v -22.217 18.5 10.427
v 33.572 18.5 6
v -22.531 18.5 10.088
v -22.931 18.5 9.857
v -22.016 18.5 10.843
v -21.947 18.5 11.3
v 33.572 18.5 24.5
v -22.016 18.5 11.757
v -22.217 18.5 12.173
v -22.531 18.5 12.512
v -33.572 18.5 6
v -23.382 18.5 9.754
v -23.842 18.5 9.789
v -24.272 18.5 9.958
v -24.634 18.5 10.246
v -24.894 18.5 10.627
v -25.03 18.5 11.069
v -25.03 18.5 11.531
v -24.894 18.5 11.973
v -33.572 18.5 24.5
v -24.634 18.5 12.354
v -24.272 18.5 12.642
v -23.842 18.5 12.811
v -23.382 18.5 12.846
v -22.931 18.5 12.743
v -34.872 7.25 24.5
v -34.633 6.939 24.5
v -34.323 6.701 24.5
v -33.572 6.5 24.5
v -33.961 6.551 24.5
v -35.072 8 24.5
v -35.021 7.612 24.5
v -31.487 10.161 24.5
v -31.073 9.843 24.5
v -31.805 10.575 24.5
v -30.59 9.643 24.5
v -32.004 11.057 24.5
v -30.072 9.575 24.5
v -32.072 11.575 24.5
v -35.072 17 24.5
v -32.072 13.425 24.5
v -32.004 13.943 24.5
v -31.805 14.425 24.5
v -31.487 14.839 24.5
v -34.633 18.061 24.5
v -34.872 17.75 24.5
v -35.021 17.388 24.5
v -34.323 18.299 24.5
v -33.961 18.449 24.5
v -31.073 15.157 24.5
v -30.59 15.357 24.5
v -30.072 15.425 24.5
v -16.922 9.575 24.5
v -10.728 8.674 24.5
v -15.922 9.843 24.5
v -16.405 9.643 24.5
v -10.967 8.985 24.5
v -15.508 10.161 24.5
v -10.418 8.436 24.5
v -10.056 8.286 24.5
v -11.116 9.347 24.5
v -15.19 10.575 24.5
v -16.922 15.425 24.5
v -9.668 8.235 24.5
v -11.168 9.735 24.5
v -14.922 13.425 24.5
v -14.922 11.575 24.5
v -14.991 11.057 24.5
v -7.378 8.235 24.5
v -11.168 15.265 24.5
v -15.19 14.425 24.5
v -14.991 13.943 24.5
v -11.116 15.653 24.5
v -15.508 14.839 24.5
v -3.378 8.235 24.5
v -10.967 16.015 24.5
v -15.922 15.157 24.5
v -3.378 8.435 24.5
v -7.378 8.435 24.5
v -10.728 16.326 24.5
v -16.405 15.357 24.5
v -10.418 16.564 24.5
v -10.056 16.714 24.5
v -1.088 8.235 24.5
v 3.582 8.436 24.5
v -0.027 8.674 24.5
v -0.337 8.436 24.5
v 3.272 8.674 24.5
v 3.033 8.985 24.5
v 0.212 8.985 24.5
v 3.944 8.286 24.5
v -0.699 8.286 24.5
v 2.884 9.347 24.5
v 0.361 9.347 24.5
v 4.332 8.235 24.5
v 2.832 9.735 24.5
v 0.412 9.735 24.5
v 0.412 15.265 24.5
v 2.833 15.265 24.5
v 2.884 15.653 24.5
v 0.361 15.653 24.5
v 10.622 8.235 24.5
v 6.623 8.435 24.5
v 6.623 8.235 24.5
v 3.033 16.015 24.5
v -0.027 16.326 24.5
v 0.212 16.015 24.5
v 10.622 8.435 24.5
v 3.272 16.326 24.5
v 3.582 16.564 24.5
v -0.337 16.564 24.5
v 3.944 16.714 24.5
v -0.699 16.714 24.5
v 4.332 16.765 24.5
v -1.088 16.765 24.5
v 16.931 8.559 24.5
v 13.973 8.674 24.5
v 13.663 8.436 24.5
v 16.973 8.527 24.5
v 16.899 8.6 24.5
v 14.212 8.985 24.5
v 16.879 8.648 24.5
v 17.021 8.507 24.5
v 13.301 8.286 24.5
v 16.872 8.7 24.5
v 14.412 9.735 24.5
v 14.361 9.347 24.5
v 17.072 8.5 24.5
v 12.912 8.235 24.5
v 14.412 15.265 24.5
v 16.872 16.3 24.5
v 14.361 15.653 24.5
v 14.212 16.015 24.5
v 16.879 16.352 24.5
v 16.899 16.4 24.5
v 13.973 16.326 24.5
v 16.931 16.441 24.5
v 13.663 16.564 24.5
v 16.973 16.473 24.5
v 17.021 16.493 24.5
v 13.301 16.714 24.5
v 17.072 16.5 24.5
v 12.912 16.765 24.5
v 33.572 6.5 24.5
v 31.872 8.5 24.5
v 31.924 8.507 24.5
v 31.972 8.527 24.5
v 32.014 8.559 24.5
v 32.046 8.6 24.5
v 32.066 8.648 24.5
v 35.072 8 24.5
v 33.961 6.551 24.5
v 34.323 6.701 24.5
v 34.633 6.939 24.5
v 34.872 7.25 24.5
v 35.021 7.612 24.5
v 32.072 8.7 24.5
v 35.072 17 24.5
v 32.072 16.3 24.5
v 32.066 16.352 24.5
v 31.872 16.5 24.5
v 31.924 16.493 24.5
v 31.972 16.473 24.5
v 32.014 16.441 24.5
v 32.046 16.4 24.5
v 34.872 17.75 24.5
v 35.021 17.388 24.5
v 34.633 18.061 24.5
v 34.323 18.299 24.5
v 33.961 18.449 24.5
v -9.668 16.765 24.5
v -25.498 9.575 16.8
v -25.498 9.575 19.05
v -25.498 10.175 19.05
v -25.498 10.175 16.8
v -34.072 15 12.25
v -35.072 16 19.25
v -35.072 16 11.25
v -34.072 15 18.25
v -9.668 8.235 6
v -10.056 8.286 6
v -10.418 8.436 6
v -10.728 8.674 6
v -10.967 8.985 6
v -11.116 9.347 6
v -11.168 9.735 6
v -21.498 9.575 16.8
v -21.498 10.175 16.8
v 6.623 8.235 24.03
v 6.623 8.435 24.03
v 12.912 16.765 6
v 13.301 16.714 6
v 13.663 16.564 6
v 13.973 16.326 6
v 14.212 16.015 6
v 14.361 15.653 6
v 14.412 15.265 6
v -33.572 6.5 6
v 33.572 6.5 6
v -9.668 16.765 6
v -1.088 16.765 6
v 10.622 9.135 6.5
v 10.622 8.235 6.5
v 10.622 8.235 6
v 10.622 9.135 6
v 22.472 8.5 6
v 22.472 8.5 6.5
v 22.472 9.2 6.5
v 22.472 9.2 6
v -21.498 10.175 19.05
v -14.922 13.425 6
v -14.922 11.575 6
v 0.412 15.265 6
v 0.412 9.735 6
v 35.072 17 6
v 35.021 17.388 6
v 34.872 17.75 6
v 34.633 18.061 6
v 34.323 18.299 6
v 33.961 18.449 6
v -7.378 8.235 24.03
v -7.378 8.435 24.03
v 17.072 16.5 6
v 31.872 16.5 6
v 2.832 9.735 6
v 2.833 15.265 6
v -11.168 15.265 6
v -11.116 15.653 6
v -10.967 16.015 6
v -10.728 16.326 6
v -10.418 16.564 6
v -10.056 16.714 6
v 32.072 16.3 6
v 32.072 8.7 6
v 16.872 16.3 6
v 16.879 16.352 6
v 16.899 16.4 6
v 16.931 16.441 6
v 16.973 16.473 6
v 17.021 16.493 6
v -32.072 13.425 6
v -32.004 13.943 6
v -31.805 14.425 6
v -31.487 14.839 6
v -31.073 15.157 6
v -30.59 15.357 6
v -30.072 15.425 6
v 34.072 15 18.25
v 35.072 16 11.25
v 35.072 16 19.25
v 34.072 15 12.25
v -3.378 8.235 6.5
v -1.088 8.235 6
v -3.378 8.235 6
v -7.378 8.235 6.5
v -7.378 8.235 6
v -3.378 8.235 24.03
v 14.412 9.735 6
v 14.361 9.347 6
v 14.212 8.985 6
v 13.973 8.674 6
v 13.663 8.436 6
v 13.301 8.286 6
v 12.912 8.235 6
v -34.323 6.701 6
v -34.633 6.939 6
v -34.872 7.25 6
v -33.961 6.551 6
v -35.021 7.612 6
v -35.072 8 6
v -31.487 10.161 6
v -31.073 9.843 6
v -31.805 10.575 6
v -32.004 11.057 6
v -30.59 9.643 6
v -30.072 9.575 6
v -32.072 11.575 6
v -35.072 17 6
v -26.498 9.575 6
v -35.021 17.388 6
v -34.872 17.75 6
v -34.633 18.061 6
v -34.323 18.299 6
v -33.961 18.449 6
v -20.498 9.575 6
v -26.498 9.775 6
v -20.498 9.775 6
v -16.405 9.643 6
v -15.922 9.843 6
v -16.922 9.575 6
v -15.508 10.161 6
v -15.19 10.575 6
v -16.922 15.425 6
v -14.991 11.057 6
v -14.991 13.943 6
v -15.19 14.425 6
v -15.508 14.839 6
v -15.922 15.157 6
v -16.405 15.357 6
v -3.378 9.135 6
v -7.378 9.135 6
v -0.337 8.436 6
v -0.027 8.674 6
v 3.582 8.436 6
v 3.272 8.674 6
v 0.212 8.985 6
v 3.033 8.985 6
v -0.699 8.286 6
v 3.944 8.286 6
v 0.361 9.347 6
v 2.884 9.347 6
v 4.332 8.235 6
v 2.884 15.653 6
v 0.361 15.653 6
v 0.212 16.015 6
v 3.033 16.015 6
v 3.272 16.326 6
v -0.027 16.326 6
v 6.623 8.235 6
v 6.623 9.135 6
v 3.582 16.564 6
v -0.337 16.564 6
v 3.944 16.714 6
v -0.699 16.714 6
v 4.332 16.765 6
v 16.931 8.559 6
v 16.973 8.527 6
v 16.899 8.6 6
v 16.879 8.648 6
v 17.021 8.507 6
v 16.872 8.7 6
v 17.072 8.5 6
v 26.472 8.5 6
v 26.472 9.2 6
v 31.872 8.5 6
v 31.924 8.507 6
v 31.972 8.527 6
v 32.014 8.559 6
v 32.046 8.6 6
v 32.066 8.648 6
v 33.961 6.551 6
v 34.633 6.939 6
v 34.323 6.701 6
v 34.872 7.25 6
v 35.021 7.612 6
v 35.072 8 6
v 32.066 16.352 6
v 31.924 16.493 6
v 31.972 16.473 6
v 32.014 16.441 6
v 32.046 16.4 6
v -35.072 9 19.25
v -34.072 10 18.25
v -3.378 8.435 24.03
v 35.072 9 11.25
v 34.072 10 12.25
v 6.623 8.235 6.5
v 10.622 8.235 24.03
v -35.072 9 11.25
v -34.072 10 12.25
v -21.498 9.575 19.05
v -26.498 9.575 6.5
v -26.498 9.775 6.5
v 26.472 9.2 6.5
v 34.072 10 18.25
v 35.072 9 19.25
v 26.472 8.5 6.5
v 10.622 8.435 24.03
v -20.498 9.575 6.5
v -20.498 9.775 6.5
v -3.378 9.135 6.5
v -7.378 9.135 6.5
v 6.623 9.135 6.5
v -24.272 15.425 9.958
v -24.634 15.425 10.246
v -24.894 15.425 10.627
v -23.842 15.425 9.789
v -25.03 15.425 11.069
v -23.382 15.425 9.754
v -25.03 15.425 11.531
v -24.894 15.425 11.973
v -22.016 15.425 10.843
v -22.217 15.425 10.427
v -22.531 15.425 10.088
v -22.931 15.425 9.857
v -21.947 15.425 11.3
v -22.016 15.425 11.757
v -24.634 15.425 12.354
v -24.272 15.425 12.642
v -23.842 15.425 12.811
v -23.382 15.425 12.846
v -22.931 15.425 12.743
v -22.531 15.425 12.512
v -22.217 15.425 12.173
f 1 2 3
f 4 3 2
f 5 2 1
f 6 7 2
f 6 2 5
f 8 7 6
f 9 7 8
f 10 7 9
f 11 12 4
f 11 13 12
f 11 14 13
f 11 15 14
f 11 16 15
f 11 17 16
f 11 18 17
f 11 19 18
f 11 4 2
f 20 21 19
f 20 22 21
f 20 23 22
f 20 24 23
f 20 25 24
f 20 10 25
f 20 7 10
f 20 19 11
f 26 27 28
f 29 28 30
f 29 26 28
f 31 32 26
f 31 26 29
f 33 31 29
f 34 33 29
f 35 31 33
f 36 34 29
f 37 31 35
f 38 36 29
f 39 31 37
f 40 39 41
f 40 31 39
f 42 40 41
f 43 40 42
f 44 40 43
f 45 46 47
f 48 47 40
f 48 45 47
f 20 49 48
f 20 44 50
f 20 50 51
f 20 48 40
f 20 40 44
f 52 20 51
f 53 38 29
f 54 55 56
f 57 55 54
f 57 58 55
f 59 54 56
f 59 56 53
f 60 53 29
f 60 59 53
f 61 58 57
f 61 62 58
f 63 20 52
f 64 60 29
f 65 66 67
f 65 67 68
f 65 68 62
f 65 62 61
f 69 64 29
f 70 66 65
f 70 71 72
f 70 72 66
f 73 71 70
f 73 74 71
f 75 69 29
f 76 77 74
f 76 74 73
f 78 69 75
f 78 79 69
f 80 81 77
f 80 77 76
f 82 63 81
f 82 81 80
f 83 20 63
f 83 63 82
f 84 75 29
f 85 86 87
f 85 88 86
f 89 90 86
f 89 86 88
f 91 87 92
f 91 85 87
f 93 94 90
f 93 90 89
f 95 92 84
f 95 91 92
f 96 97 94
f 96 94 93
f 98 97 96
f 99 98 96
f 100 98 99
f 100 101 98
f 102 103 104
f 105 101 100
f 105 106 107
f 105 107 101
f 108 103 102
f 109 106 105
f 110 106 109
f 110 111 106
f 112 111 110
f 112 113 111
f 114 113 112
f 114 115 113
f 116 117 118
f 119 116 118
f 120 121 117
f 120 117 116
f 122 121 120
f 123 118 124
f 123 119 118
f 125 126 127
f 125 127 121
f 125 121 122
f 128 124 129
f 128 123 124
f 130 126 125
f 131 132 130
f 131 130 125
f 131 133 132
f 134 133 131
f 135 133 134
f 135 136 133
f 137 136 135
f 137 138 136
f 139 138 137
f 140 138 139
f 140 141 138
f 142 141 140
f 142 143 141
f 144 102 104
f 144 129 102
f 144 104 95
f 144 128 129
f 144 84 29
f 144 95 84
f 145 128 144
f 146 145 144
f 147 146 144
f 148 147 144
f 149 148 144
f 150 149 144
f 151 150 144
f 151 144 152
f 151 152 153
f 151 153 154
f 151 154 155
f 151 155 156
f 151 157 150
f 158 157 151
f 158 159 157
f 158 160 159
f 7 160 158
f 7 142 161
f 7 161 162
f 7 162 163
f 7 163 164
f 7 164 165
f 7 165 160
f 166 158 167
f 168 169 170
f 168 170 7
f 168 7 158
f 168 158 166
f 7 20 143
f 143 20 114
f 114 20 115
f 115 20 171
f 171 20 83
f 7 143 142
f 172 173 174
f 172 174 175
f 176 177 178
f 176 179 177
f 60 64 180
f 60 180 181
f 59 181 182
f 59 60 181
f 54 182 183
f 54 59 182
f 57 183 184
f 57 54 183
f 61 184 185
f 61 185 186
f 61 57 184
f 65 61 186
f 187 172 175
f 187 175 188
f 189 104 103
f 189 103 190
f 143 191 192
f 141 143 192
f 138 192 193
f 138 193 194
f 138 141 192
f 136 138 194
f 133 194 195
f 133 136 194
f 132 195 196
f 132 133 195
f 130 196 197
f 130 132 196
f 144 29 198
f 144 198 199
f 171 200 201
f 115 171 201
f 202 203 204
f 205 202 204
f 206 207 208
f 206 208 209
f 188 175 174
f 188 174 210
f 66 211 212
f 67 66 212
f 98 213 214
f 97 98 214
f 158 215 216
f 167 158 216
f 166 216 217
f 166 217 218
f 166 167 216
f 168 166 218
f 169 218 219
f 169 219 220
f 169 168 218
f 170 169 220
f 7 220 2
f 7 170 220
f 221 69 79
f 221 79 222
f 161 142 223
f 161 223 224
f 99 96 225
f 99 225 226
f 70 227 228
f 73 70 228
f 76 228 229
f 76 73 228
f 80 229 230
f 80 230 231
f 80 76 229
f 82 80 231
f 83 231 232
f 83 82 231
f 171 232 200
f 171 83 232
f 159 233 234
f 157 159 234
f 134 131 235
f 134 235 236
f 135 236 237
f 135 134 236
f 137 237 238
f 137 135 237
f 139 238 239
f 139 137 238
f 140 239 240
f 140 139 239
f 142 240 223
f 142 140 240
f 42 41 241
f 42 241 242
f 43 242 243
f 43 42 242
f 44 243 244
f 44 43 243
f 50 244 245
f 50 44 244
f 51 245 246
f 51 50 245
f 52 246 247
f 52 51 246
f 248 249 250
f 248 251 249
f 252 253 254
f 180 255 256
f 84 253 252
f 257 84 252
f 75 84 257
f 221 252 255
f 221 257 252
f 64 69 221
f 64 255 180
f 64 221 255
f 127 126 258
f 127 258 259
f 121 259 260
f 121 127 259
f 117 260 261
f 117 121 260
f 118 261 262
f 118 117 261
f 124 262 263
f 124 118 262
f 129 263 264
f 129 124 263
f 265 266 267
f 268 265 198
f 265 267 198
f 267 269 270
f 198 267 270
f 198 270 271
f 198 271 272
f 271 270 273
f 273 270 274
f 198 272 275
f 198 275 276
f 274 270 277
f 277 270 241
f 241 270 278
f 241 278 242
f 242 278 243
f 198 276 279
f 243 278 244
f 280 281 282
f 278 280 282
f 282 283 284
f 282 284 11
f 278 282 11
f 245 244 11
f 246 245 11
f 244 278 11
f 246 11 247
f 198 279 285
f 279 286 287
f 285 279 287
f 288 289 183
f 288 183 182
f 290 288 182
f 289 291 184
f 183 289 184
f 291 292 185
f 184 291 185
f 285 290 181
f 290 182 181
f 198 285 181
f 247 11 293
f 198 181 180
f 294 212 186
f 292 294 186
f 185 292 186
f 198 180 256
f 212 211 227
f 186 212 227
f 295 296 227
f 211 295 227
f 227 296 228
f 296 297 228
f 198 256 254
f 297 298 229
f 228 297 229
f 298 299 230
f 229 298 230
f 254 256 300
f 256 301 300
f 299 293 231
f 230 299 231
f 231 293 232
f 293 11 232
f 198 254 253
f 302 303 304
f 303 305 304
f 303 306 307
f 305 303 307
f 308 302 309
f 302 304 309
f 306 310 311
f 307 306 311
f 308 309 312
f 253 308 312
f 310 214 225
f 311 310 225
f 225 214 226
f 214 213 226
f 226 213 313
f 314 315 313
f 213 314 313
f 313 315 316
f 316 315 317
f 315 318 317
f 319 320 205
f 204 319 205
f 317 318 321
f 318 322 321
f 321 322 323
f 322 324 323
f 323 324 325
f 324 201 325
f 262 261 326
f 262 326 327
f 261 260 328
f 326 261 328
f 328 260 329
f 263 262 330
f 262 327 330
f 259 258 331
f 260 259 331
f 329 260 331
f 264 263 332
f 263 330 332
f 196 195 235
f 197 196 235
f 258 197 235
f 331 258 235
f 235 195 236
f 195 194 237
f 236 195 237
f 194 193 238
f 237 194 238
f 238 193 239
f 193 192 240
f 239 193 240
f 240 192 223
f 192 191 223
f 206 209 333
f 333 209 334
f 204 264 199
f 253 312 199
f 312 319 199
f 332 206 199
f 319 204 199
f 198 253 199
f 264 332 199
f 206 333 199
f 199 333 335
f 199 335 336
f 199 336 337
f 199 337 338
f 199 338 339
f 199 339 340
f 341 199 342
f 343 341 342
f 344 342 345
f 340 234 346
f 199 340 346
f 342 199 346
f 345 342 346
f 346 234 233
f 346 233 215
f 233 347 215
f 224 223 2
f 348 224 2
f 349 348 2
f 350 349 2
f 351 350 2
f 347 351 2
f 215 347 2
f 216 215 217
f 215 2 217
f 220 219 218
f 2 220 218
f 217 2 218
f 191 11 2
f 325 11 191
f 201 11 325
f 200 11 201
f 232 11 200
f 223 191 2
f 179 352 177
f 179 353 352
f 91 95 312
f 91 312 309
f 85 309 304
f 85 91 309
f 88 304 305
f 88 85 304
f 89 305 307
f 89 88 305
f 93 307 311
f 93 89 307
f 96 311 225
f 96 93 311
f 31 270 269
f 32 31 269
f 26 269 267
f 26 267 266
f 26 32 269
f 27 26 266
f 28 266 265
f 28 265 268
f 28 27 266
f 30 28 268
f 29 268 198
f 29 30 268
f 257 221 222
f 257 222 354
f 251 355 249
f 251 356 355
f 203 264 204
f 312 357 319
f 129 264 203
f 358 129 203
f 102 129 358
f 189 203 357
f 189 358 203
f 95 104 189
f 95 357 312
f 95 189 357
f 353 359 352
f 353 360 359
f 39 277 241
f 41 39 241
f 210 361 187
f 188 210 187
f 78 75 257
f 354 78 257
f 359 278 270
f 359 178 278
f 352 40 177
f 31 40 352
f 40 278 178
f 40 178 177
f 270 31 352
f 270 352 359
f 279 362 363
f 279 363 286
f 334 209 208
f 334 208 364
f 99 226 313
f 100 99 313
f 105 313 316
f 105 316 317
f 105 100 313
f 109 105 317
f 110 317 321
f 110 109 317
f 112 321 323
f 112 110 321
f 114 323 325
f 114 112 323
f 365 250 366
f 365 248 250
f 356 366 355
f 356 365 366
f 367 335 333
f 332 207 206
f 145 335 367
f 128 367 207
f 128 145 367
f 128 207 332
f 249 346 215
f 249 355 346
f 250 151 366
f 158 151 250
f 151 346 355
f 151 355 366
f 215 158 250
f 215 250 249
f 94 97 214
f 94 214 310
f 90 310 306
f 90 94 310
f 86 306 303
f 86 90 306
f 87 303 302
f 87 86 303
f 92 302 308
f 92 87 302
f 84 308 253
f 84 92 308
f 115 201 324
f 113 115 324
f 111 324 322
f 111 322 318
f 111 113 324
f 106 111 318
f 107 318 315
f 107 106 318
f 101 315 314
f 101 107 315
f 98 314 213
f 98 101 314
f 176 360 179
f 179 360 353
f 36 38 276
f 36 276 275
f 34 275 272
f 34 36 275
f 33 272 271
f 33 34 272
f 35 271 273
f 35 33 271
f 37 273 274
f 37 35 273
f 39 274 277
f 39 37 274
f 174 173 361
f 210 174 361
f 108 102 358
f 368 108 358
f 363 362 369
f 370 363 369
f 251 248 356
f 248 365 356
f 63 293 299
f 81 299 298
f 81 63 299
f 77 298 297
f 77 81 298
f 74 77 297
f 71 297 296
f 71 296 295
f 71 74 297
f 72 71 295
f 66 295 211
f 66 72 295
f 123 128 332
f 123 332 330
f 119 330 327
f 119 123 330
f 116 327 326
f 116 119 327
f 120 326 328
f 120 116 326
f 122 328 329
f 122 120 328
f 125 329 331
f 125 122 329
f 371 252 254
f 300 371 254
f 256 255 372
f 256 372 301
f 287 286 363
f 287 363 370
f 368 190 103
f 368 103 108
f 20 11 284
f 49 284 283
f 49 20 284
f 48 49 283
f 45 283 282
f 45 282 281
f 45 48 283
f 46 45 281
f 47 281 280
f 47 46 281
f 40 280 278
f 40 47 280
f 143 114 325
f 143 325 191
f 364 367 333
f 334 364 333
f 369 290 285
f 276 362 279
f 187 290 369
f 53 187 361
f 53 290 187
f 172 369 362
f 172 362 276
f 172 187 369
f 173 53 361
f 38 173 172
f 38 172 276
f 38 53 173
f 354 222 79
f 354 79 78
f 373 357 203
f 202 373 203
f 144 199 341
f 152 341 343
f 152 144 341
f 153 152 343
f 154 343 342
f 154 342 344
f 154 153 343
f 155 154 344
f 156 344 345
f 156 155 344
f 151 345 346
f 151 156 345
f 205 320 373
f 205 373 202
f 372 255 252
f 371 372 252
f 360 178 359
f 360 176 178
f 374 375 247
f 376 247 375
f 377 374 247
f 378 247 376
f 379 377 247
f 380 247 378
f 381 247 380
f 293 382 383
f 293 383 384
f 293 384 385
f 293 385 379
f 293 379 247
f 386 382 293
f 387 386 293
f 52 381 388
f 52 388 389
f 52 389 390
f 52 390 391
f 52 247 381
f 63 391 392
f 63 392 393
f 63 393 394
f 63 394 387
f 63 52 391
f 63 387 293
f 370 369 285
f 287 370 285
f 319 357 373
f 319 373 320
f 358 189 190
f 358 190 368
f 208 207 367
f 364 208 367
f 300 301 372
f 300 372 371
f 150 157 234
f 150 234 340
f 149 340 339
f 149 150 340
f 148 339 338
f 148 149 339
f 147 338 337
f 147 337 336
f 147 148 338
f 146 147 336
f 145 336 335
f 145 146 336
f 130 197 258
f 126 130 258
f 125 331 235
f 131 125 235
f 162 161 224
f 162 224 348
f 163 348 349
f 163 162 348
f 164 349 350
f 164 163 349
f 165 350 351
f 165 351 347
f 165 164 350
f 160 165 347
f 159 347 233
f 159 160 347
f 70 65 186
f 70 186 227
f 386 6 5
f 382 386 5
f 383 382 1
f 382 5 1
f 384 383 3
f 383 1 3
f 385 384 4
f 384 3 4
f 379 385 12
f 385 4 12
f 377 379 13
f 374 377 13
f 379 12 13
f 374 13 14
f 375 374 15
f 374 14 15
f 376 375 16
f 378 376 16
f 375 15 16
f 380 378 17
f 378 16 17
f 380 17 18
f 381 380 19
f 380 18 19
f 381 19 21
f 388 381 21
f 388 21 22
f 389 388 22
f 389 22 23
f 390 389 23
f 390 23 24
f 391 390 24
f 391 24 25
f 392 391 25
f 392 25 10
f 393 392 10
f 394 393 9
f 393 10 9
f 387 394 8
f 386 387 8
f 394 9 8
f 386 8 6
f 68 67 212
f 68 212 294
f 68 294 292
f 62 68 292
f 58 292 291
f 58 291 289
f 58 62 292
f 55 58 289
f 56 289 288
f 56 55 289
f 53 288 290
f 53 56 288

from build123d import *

# Parameters (mm, degrees)
F2_DEPTH  = 18.5
F3_R      = 1.55
F4_DEPTH  = 3.075
F5_W      = 6
F5_H      = 0.5
F6_DEPTH  = 0.2
F5_W_2    = 4
F5_H_2    = 2.25
F7_DEPTH  = 0.6
F8_W      = 4
F8_H      = 0.5
F9_DEPTH  = 0.9
F8_H_2    = 0.47
F10_DEPTH = 0.2
F11_W     = 4
F11_H     = 0.5
F12_DEPTH = 0.9
F11_H_2   = 0.47
F13_DEPTH = 0.2
F14_W     = 4
F14_H     = 0.5
F15_DEPTH = 0.7
F16_W     = 8
F16_H     = 7
F17_DEPTH = 1
F17_TAPER = 45
F18_W     = 8
F18_H     = 7
F19_DEPTH = 1
F19_TAPER = 45
F22_ANGLE = 90


with BuildPart() as f2:
    # F1 (on Front) → F2 (new body)
    with BuildSketch(Plane.XZ):
        with BuildLine():
            Line((-33.5725, -6), (33.5725, -6))
            ThreePointArc((33.5725, -6), (34.6331601718, -5.5606601718), (35.0725, -4.5))
            Line((35.0725, -4.5), (35.0725, 4.5))
            ThreePointArc((35.0725, 4.5), (34.6331601718, 5.5606601718), (33.5725, 6))
            Line((33.5725, 6), (-33.5725, 6))
            ThreePointArc((-33.5725, 6), (-34.6331601718, 5.5606601718), (-35.0725, 4.5))
            Line((-35.0725, 4.5), (-35.0725, -4.5))
            ThreePointArc((-35.0725, -4.5), (-34.6331601718, -5.5606601718), (-33.5725, -6))
        make_face()
        with BuildLine():
            ThreePointArc((-14.9225, -0.925), (-15.5082864376, -2.3392135624), (-16.9225, -2.925))
            Line((-16.9225, -2.925), (-30.0725, -2.925))
            ThreePointArc((-30.0725, -2.925), (-31.4867135624, -2.3392135624), (-32.0725, -0.925))
            Line((-32.0725, -0.925), (-32.0725, 0.925))
            ThreePointArc((-32.0725, 0.925), (-31.4867135624, 2.3392135624), (-30.0725, 2.925))
            Line((-30.0725, 2.925), (-16.9225, 2.925))
            ThreePointArc((-16.9225, 2.925), (-15.5082864376, 2.3392135624), (-14.9225, 0.925))
            Line((-14.9225, 0.925), (-14.9225, -0.925))
        make_face(mode=Mode.SUBTRACT)
        with BuildLine():
            Line((-9.6675, 4.265), (-1.0875, 4.265))
            ThreePointArc((-1.0875, 4.265), (-0.0268398282, 3.8256601718), (0.4125, 2.765))
            Line((0.4125, 2.765), (0.4125, -2.765))
            ThreePointArc((0.4125, -2.765), (-0.0268398282, -3.8256601718), (-1.0875, -4.265))
            Line((-1.0875, -4.265), (-9.6675, -4.265))
            ThreePointArc((-9.6675, -4.265), (-10.7281601718, -3.8256601718), (-11.1675, -2.765))
            Line((-11.1675, -2.765), (-11.1675, 2.765))
            ThreePointArc((-11.1675, 2.765), (-10.7281601718, 3.8256601718), (-9.6675, 4.265))
        make_face(mode=Mode.SUBTRACT)
        with BuildLine():
            Line((4.3325, 4.265), (12.9125, 4.265))
            ThreePointArc((12.9125, 4.265), (13.9731601718, 3.8256601718), (14.4125, 2.765))
            Line((14.4125, 2.765), (14.4125, -2.765))
            ThreePointArc((14.4125, -2.765), (13.9731601718, -3.8256601718), (12.9125, -4.265))
            Line((12.9125, -4.265), (4.3325, -4.265))
            ThreePointArc((4.3325, -4.265), (3.2718398282, -3.8256601718), (2.8325, -2.765))
            Line((2.8325, -2.765), (2.8325, 2.765))
            ThreePointArc((2.8325, 2.765), (3.2718398282, 3.8256601718), (4.3325, 4.265))
        make_face(mode=Mode.SUBTRACT)
        with BuildLine():
            ThreePointArc((32.0725, -3.8), (32.0139213562, -3.9414213562), (31.8725, -4))
            Line((31.8725, -4), (17.0725, -4))
            ThreePointArc((17.0725, -4), (16.9310786438, -3.9414213562), (16.8725, -3.8))
            Line((16.8725, -3.8), (16.8725, 3.8))
            ThreePointArc((16.8725, 3.8), (16.9310786438, 3.9414213562), (17.0725, 4))
            Line((17.0725, 4), (31.8725, 4))
            ThreePointArc((31.8725, 4), (32.0139213562, 3.9414213562), (32.0725, 3.8))
            Line((32.0725, 3.8), (32.0725, -3.8))
        make_face(mode=Mode.SUBTRACT)
    extrude(amount=-F2_DEPTH)

    # F3 (on face) → F4 (cut, through all)
    with BuildSketch(Plane.XY.offset(6)):
        with Locations((-23.4975, 13.2)):
            Circle(F3_R)
    extrude(amount=-F4_DEPTH, mode=Mode.SUBTRACT)

    # F5 (on face) → F6 (join)
    with BuildSketch(Plane.XY.offset(-2.925)):
        with Locations((-23.4975, 18.25)):
            Rectangle(F5_W, F5_H)
    extrude(amount=F6_DEPTH)

    # F5 (on face) → F7 (join)
    with BuildSketch(Plane.XY.offset(-2.925)):
        with Locations((-23.4975, 6.575)):
            Rectangle(F5_W_2, F5_H_2)
    extrude(amount=F7_DEPTH)

    # F8 (on face) → F9 (join)
    with BuildSketch(Plane.XY.offset(-4.265)):
        with Locations((-5.3775, 18.25)):
            Rectangle(F8_W, F8_H)
    extrude(amount=F9_DEPTH)

    # F8 (on face) → F10 (join)
    with BuildSketch(Plane.XY.offset(-4.265)):
        with Locations((-5.3775, 0.235)):
            Rectangle(F8_W, F8_H_2)
    extrude(amount=F10_DEPTH)

    # F11 (on face) → F12 (join)
    with BuildSketch(Plane.XY.offset(-4.265)):
        with Locations((8.6225, 18.25)):
            Rectangle(F11_W, F11_H)
    extrude(amount=F12_DEPTH)

    # F11 (on face) → F13 (join)
    with BuildSketch(Plane.XY.offset(-4.265)):
        with Locations((8.6225, 0.235)):
            Rectangle(F11_W, F11_H_2)
    extrude(amount=F13_DEPTH)

    # F14 (on face) → F15 (join)
    with BuildSketch(Plane.XY.offset(-4)):
        with Locations((24.4725, 18.25)):
            Rectangle(F14_W, F14_H)
    extrude(amount=F15_DEPTH)

    # F16 (on face) → F17 (cut)
    with BuildSketch(Plane.YZ.offset(35.0725)):
        with Locations((9.25, 0)):
            Rectangle(F16_W, F16_H)
    extrude(amount=-F17_DEPTH, taper=F17_TAPER, mode=Mode.SUBTRACT)

    # F18 (on face) → F19 (cut)
    with BuildSketch(Plane(origin=(-35.0725, 0, 0), x_dir=(0, -1, 0), z_dir=(-1, 0, 0))):
        with Locations((-9.25, 0)):
            Rectangle(F18_W, F18_H)
    extrude(amount=-F19_DEPTH, taper=F19_TAPER, mode=Mode.SUBTRACT)


with BuildPart() as f2_1:
    # F22: moved
    add(f2.part.rotate(Axis((0, 18.5, 6), (-1, 0, 0)), F22_ANGLE))


solid = f2_1.part
